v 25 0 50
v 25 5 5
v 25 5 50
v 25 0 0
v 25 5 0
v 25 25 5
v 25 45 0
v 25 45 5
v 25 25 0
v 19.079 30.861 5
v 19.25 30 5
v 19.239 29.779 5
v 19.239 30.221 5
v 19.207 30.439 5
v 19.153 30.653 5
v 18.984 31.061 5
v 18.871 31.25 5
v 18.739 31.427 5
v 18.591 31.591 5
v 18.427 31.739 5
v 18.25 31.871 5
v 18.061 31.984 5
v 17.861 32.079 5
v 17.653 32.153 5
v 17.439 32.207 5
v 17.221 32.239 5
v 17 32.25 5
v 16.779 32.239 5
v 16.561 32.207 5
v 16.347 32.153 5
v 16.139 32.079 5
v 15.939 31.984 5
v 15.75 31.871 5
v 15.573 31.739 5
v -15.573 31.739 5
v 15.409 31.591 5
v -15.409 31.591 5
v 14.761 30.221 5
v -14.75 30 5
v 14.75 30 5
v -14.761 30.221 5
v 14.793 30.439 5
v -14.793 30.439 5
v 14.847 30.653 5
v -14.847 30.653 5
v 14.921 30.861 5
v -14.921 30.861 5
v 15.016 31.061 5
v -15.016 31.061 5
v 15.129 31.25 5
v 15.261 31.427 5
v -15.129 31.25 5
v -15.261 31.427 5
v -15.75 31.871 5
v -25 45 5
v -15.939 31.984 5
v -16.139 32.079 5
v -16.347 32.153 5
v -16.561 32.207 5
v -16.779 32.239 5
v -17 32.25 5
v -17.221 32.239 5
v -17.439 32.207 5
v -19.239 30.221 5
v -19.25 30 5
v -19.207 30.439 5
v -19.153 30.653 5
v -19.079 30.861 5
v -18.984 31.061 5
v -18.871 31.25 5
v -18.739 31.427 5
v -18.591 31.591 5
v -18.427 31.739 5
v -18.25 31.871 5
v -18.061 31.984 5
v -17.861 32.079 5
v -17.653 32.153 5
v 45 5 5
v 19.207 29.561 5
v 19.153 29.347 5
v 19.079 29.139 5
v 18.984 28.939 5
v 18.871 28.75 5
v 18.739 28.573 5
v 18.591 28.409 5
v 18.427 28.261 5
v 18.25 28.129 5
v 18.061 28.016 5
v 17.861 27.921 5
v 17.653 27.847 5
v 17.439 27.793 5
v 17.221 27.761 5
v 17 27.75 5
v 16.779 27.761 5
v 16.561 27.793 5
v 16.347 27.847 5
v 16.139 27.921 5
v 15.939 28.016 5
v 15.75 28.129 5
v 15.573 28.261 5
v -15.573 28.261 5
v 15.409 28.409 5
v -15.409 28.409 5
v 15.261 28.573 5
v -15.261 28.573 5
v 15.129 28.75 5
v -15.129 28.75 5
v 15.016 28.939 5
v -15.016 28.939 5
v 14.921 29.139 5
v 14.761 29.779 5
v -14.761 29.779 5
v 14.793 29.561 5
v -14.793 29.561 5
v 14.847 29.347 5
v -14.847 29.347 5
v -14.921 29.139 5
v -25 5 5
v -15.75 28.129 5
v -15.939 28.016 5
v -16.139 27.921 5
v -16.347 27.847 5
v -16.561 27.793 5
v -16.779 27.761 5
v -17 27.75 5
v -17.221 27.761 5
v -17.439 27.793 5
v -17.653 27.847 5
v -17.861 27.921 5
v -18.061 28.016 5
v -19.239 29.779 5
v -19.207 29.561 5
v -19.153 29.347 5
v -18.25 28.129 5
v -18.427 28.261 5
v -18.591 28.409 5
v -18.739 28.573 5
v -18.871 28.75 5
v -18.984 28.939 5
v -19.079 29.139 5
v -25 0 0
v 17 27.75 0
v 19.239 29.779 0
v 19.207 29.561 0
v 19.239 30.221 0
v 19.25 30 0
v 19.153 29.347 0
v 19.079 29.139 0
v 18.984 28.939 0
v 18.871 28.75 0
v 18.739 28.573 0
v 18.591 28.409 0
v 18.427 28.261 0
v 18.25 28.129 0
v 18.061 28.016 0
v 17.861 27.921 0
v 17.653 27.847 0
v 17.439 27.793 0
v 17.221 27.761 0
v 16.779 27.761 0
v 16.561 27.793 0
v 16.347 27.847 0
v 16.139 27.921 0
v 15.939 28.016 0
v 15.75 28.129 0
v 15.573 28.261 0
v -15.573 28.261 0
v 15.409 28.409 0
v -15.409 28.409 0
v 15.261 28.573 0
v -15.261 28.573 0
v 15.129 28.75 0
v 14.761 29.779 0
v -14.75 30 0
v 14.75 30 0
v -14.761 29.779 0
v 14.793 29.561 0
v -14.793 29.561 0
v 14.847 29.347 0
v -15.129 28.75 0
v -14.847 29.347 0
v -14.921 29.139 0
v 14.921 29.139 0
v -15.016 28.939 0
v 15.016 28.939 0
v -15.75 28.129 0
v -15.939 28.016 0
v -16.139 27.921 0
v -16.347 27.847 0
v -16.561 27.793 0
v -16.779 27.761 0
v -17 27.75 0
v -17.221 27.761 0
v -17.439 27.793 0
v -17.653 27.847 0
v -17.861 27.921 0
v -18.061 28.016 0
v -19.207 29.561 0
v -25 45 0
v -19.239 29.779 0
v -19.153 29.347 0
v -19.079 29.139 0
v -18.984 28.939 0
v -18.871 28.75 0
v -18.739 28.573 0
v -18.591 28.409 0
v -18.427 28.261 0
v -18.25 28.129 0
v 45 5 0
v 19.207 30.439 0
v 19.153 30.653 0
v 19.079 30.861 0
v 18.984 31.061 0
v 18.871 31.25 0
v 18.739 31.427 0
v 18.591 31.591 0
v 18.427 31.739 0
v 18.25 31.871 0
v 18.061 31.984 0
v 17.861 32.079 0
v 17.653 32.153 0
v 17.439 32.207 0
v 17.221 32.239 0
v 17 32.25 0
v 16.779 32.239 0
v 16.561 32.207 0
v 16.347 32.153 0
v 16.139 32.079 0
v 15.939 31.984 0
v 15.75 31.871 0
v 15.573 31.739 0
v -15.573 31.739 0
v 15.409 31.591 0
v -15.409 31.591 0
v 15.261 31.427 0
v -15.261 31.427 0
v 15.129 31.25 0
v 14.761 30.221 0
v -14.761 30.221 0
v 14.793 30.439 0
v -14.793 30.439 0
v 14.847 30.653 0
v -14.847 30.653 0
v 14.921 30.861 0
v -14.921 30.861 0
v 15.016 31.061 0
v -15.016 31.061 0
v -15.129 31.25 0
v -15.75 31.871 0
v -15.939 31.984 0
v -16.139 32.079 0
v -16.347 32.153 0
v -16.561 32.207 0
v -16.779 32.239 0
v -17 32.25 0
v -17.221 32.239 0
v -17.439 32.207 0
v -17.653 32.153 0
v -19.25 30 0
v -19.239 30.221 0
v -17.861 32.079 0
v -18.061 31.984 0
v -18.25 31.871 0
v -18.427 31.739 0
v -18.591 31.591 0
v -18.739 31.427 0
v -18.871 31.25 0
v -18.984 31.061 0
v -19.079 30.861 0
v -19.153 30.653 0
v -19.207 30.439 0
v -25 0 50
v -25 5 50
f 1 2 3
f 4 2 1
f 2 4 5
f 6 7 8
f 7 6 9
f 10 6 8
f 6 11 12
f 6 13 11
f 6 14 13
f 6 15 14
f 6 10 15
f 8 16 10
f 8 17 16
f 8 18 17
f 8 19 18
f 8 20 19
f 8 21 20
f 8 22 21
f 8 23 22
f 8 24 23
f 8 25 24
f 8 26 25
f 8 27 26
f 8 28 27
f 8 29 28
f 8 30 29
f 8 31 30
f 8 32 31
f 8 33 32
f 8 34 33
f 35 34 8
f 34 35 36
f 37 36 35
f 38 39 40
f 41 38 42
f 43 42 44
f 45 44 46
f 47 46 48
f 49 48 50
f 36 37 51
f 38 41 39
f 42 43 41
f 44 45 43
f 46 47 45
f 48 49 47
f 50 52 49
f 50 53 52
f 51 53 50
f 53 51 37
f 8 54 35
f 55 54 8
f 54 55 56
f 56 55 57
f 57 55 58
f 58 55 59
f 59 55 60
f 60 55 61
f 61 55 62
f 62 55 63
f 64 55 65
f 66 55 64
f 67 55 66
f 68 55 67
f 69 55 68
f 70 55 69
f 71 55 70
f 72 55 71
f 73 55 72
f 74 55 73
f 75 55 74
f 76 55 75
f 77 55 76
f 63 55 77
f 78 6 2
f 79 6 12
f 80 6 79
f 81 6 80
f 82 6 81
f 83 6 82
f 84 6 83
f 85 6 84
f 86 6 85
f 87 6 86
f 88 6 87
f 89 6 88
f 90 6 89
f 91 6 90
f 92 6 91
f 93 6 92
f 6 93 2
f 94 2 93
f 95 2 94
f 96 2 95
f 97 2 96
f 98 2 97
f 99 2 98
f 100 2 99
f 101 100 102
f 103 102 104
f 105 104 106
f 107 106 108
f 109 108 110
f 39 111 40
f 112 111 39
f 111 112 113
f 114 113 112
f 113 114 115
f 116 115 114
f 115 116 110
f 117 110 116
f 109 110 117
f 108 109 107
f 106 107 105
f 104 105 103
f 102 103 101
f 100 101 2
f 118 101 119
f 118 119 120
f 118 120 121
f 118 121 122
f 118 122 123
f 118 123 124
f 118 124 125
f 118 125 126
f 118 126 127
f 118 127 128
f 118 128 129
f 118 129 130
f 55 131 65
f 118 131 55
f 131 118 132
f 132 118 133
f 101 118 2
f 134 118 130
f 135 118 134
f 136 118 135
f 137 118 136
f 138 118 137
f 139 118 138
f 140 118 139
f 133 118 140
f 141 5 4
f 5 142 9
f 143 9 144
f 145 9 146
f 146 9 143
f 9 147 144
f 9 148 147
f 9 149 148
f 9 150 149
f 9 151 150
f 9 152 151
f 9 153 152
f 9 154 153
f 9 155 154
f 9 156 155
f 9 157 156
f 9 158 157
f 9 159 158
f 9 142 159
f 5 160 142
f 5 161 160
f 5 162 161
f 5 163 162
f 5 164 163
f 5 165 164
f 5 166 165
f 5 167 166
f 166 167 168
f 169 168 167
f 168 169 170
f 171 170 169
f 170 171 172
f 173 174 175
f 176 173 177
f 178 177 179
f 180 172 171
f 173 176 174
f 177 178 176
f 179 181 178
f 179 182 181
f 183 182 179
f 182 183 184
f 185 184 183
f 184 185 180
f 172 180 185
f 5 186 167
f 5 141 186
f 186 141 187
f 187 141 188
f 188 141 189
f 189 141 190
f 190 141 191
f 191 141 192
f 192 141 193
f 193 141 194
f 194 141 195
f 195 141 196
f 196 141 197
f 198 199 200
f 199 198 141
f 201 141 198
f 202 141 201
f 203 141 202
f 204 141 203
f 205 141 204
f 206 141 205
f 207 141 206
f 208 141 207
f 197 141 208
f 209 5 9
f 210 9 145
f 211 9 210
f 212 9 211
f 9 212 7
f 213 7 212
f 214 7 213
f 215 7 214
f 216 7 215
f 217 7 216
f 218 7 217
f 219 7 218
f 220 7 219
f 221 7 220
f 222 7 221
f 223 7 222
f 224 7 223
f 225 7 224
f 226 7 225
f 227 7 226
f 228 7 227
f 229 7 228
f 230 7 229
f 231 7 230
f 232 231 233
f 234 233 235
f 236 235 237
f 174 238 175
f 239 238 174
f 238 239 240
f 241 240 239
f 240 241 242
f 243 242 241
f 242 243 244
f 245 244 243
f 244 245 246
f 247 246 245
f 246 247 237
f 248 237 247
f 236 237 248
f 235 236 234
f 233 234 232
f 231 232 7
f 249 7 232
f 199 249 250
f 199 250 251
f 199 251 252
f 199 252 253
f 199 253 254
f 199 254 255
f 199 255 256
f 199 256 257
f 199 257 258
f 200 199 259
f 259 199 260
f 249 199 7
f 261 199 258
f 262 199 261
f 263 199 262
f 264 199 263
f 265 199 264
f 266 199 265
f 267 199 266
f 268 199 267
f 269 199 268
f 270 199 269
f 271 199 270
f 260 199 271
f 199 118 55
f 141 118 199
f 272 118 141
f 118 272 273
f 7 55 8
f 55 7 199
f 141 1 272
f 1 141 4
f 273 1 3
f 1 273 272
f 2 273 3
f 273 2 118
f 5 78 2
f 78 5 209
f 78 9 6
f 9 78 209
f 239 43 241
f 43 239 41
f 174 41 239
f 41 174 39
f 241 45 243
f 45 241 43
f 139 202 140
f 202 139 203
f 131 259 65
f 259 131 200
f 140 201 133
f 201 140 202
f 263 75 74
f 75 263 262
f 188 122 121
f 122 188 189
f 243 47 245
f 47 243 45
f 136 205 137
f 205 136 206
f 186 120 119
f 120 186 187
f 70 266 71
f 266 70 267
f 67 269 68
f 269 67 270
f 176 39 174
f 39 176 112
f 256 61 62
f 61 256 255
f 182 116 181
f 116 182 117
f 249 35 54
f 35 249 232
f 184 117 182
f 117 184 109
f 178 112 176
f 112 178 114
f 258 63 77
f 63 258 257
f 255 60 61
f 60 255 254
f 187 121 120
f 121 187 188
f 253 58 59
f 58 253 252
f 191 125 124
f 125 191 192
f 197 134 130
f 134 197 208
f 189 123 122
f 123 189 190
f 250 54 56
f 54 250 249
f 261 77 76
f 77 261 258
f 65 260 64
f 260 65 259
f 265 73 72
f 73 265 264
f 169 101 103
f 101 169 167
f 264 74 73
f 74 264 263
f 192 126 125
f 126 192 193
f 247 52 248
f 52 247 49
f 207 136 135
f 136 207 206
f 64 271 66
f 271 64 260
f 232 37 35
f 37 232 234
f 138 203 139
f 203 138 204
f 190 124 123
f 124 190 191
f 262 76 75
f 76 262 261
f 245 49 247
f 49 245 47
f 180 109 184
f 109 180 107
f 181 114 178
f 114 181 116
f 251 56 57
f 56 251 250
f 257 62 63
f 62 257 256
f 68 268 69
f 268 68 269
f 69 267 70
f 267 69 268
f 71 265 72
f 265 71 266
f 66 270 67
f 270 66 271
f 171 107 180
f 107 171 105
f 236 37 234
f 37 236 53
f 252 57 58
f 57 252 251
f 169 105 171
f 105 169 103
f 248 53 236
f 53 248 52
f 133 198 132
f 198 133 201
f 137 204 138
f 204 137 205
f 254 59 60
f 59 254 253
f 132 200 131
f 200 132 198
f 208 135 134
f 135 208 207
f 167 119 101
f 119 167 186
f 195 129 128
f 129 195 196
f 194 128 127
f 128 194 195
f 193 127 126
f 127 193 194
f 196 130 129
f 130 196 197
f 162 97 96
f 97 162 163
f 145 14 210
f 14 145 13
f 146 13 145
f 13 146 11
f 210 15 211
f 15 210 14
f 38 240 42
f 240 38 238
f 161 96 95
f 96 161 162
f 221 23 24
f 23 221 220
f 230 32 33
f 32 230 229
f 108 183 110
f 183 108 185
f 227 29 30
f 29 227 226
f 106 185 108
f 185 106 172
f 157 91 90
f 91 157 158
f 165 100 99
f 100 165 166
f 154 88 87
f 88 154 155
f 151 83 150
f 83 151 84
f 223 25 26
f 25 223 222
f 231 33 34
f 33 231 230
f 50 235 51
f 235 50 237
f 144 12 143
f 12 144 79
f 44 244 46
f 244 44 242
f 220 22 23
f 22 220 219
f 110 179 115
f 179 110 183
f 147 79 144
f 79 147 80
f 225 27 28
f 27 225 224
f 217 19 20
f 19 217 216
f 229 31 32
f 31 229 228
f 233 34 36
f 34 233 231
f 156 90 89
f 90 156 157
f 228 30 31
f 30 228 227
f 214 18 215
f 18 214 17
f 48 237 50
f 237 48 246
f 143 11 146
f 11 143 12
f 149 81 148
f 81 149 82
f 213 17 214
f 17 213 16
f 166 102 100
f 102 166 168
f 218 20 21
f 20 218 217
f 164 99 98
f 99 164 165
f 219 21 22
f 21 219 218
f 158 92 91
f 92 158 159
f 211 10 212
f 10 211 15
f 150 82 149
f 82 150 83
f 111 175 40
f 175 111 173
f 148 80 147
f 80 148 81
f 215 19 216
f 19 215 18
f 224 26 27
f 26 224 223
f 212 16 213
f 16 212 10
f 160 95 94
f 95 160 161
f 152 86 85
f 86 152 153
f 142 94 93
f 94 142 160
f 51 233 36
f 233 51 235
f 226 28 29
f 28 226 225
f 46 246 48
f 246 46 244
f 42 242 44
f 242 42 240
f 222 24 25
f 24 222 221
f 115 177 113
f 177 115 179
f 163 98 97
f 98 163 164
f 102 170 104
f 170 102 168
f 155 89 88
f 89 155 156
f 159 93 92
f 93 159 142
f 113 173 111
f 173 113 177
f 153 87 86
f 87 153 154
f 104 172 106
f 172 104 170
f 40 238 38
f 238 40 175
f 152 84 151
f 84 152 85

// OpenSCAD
// L-shaped NEMA 17 stepper motor mounting bracket
// Print orientation: base plate on bed (z=0), builds upward (+Z)

// Base plate dimensions
base_x_min = -25;
base_x_max = 25;
base_y_min = 0;
base_y_max = 45;
base_z_min = 0;
base_z_max = 5;

// Vertical motor plate dimensions
plate_x_min = -25;
plate_x_max = 25;
plate_y_min = 0;
plate_y_max = 5;
plate_z_min = 0;
plate_z_max = 50;

// Base plate M4 through-holes (vertical, along Z)
m4_hole_dia = 4.5;
m4_hole1_x = -17;
m4_hole1_y = 30;
m4_hole2_x = 17;
m4_hole2_y = 30;

// Motor plate centring boss hole (along Y)
boss_hole_dia = 23;
boss_hole_x = 0;
boss_hole_z = 28;

// Motor plate M3 screw holes (along Y)
m3_hole_dia = 3.4;
m3_pattern_size = 31;  // square pattern centred on boss hole
m3_hole_offset = m3_pattern_size / 2;  // 15.5 mm from centre

// Gusset dimensions
gusset_thickness = 5;
gusset_leg_y = 20;  // leg along +Y
gusset_leg_z = 20;  // leg along +Z
gusset_corner_y = 5;  // right-angle corner y position
gusset_corner_z = 5;  // right-angle corner z position

// Left gusset x range
gusset_left_x_min = -25;
gusset_left_x_max = -20;

// Right gusset x range
gusset_right_x_min = 20;
gusset_right_x_max = 25;

$fn = 64;

// Base plate
module base_plate() { translate([base_x_min, base_y_min, base_z_min])
    cube([base_x_max - base_x_min, base_y_max - base_y_min, base_z_max - base_z_min]); }

// Vertical motor plate
module motor_plate() { translate([plate_x_min, plate_y_min, plate_z_min])
    cube([plate_x_max - plate_x_min, plate_y_max - plate_y_min, plate_z_max - plate_z_min]); }

// M4 holes in base plate (vertical through-holes, along Z)
module m4_hole1() { translate([m4_hole1_x, m4_hole1_y, -1])
    cylinder(h = base_z_max - base_z_min + 2, d = m4_hole_dia); }

module m4_hole2() { translate([m4_hole2_x, m4_hole2_y, -1])
    cylinder(h = base_z_max - base_z_min + 2, d = m4_hole_dia); }

// Boss hole in motor plate (along Y)
module boss_hole() { translate([boss_hole_x, -1, boss_hole_z])
    rotate([90, 0, 0])
    cylinder(h = plate_y_max - plate_y_min + 2, d = boss_hole_dia); }

// M3 screw holes in motor plate (along Y)
// Four holes on a 31 mm square pattern centred on boss hole
module m3_hole1() { translate([boss_hole_x - m3_hole_offset, -1, boss_hole_z - m3_hole_offset])
    rotate([90, 0, 0])
    cylinder(h = plate_y_max - plate_y_min + 2, d = m3_hole_dia); }

module m3_hole2() { translate([boss_hole_x + m3_hole_offset, -1, boss_hole_z - m3_hole_offset])
    rotate([90, 0, 0])
    cylinder(h = plate_y_max - plate_y_min + 2, d = m3_hole_dia); }

module m3_hole3() { translate([boss_hole_x - m3_hole_offset, -1, boss_hole_z + m3_hole_offset])
    rotate([90, 0, 0])
    cylinder(h = plate_y_max - plate_y_min + 2, d = m3_hole_dia); }

module m3_hole4() { translate([boss_hole_x + m3_hole_offset, -1, boss_hole_z + m3_hole_offset])
    rotate([90, 0, 0])
    cylinder(h = plate_y_max - plate_y_min + 2, d = m3_hole_dia); }

// Left gusset: right triangle in YZ plane, extruded along X
// Vertices in YZ: (y=5, z=5), (y=25, z=5), (y=5, z=25)
module left_gusset() { translate([gusset_left_x_min, 0, 0])
    linear_extrude(height = gusset_left_x_max - gusset_left_x_min)
    polygon(points = [[gusset_corner_y, gusset_corner_z],
                       [gusset_corner_y + gusset_leg_y, gusset_corner_z],
                       [gusset_corner_y, gusset_corner_z + gusset_leg_z]]); }

// Right gusset: right triangle in YZ plane, extruded along X
module right_gusset() { translate([gusset_right_x_min, 0, 0])
    linear_extrude(height = gusset_right_x_max - gusset_right_x_min)
    polygon(points = [[gusset_corner_y, gusset_corner_z],
                       [gusset_corner_y + gusset_leg_y, gusset_corner_z],
                       [gusset_corner_y, gusset_corner_z + gusset_leg_z]]); }

// Assemble the bracket
difference() {
    union() {
        base_plate();
        motor_plate();
        left_gusset();
        right_gusset();
    }
    // Cut M4 holes from base plate
    m4_hole1();
    m4_hole2();
    // Cut boss hole from motor plate
    boss_hole();
    // Cut M3 screw holes from motor plate
    m3_hole1();
    m3_hole2();
    m3_hole3();
    m3_hole4();
}
